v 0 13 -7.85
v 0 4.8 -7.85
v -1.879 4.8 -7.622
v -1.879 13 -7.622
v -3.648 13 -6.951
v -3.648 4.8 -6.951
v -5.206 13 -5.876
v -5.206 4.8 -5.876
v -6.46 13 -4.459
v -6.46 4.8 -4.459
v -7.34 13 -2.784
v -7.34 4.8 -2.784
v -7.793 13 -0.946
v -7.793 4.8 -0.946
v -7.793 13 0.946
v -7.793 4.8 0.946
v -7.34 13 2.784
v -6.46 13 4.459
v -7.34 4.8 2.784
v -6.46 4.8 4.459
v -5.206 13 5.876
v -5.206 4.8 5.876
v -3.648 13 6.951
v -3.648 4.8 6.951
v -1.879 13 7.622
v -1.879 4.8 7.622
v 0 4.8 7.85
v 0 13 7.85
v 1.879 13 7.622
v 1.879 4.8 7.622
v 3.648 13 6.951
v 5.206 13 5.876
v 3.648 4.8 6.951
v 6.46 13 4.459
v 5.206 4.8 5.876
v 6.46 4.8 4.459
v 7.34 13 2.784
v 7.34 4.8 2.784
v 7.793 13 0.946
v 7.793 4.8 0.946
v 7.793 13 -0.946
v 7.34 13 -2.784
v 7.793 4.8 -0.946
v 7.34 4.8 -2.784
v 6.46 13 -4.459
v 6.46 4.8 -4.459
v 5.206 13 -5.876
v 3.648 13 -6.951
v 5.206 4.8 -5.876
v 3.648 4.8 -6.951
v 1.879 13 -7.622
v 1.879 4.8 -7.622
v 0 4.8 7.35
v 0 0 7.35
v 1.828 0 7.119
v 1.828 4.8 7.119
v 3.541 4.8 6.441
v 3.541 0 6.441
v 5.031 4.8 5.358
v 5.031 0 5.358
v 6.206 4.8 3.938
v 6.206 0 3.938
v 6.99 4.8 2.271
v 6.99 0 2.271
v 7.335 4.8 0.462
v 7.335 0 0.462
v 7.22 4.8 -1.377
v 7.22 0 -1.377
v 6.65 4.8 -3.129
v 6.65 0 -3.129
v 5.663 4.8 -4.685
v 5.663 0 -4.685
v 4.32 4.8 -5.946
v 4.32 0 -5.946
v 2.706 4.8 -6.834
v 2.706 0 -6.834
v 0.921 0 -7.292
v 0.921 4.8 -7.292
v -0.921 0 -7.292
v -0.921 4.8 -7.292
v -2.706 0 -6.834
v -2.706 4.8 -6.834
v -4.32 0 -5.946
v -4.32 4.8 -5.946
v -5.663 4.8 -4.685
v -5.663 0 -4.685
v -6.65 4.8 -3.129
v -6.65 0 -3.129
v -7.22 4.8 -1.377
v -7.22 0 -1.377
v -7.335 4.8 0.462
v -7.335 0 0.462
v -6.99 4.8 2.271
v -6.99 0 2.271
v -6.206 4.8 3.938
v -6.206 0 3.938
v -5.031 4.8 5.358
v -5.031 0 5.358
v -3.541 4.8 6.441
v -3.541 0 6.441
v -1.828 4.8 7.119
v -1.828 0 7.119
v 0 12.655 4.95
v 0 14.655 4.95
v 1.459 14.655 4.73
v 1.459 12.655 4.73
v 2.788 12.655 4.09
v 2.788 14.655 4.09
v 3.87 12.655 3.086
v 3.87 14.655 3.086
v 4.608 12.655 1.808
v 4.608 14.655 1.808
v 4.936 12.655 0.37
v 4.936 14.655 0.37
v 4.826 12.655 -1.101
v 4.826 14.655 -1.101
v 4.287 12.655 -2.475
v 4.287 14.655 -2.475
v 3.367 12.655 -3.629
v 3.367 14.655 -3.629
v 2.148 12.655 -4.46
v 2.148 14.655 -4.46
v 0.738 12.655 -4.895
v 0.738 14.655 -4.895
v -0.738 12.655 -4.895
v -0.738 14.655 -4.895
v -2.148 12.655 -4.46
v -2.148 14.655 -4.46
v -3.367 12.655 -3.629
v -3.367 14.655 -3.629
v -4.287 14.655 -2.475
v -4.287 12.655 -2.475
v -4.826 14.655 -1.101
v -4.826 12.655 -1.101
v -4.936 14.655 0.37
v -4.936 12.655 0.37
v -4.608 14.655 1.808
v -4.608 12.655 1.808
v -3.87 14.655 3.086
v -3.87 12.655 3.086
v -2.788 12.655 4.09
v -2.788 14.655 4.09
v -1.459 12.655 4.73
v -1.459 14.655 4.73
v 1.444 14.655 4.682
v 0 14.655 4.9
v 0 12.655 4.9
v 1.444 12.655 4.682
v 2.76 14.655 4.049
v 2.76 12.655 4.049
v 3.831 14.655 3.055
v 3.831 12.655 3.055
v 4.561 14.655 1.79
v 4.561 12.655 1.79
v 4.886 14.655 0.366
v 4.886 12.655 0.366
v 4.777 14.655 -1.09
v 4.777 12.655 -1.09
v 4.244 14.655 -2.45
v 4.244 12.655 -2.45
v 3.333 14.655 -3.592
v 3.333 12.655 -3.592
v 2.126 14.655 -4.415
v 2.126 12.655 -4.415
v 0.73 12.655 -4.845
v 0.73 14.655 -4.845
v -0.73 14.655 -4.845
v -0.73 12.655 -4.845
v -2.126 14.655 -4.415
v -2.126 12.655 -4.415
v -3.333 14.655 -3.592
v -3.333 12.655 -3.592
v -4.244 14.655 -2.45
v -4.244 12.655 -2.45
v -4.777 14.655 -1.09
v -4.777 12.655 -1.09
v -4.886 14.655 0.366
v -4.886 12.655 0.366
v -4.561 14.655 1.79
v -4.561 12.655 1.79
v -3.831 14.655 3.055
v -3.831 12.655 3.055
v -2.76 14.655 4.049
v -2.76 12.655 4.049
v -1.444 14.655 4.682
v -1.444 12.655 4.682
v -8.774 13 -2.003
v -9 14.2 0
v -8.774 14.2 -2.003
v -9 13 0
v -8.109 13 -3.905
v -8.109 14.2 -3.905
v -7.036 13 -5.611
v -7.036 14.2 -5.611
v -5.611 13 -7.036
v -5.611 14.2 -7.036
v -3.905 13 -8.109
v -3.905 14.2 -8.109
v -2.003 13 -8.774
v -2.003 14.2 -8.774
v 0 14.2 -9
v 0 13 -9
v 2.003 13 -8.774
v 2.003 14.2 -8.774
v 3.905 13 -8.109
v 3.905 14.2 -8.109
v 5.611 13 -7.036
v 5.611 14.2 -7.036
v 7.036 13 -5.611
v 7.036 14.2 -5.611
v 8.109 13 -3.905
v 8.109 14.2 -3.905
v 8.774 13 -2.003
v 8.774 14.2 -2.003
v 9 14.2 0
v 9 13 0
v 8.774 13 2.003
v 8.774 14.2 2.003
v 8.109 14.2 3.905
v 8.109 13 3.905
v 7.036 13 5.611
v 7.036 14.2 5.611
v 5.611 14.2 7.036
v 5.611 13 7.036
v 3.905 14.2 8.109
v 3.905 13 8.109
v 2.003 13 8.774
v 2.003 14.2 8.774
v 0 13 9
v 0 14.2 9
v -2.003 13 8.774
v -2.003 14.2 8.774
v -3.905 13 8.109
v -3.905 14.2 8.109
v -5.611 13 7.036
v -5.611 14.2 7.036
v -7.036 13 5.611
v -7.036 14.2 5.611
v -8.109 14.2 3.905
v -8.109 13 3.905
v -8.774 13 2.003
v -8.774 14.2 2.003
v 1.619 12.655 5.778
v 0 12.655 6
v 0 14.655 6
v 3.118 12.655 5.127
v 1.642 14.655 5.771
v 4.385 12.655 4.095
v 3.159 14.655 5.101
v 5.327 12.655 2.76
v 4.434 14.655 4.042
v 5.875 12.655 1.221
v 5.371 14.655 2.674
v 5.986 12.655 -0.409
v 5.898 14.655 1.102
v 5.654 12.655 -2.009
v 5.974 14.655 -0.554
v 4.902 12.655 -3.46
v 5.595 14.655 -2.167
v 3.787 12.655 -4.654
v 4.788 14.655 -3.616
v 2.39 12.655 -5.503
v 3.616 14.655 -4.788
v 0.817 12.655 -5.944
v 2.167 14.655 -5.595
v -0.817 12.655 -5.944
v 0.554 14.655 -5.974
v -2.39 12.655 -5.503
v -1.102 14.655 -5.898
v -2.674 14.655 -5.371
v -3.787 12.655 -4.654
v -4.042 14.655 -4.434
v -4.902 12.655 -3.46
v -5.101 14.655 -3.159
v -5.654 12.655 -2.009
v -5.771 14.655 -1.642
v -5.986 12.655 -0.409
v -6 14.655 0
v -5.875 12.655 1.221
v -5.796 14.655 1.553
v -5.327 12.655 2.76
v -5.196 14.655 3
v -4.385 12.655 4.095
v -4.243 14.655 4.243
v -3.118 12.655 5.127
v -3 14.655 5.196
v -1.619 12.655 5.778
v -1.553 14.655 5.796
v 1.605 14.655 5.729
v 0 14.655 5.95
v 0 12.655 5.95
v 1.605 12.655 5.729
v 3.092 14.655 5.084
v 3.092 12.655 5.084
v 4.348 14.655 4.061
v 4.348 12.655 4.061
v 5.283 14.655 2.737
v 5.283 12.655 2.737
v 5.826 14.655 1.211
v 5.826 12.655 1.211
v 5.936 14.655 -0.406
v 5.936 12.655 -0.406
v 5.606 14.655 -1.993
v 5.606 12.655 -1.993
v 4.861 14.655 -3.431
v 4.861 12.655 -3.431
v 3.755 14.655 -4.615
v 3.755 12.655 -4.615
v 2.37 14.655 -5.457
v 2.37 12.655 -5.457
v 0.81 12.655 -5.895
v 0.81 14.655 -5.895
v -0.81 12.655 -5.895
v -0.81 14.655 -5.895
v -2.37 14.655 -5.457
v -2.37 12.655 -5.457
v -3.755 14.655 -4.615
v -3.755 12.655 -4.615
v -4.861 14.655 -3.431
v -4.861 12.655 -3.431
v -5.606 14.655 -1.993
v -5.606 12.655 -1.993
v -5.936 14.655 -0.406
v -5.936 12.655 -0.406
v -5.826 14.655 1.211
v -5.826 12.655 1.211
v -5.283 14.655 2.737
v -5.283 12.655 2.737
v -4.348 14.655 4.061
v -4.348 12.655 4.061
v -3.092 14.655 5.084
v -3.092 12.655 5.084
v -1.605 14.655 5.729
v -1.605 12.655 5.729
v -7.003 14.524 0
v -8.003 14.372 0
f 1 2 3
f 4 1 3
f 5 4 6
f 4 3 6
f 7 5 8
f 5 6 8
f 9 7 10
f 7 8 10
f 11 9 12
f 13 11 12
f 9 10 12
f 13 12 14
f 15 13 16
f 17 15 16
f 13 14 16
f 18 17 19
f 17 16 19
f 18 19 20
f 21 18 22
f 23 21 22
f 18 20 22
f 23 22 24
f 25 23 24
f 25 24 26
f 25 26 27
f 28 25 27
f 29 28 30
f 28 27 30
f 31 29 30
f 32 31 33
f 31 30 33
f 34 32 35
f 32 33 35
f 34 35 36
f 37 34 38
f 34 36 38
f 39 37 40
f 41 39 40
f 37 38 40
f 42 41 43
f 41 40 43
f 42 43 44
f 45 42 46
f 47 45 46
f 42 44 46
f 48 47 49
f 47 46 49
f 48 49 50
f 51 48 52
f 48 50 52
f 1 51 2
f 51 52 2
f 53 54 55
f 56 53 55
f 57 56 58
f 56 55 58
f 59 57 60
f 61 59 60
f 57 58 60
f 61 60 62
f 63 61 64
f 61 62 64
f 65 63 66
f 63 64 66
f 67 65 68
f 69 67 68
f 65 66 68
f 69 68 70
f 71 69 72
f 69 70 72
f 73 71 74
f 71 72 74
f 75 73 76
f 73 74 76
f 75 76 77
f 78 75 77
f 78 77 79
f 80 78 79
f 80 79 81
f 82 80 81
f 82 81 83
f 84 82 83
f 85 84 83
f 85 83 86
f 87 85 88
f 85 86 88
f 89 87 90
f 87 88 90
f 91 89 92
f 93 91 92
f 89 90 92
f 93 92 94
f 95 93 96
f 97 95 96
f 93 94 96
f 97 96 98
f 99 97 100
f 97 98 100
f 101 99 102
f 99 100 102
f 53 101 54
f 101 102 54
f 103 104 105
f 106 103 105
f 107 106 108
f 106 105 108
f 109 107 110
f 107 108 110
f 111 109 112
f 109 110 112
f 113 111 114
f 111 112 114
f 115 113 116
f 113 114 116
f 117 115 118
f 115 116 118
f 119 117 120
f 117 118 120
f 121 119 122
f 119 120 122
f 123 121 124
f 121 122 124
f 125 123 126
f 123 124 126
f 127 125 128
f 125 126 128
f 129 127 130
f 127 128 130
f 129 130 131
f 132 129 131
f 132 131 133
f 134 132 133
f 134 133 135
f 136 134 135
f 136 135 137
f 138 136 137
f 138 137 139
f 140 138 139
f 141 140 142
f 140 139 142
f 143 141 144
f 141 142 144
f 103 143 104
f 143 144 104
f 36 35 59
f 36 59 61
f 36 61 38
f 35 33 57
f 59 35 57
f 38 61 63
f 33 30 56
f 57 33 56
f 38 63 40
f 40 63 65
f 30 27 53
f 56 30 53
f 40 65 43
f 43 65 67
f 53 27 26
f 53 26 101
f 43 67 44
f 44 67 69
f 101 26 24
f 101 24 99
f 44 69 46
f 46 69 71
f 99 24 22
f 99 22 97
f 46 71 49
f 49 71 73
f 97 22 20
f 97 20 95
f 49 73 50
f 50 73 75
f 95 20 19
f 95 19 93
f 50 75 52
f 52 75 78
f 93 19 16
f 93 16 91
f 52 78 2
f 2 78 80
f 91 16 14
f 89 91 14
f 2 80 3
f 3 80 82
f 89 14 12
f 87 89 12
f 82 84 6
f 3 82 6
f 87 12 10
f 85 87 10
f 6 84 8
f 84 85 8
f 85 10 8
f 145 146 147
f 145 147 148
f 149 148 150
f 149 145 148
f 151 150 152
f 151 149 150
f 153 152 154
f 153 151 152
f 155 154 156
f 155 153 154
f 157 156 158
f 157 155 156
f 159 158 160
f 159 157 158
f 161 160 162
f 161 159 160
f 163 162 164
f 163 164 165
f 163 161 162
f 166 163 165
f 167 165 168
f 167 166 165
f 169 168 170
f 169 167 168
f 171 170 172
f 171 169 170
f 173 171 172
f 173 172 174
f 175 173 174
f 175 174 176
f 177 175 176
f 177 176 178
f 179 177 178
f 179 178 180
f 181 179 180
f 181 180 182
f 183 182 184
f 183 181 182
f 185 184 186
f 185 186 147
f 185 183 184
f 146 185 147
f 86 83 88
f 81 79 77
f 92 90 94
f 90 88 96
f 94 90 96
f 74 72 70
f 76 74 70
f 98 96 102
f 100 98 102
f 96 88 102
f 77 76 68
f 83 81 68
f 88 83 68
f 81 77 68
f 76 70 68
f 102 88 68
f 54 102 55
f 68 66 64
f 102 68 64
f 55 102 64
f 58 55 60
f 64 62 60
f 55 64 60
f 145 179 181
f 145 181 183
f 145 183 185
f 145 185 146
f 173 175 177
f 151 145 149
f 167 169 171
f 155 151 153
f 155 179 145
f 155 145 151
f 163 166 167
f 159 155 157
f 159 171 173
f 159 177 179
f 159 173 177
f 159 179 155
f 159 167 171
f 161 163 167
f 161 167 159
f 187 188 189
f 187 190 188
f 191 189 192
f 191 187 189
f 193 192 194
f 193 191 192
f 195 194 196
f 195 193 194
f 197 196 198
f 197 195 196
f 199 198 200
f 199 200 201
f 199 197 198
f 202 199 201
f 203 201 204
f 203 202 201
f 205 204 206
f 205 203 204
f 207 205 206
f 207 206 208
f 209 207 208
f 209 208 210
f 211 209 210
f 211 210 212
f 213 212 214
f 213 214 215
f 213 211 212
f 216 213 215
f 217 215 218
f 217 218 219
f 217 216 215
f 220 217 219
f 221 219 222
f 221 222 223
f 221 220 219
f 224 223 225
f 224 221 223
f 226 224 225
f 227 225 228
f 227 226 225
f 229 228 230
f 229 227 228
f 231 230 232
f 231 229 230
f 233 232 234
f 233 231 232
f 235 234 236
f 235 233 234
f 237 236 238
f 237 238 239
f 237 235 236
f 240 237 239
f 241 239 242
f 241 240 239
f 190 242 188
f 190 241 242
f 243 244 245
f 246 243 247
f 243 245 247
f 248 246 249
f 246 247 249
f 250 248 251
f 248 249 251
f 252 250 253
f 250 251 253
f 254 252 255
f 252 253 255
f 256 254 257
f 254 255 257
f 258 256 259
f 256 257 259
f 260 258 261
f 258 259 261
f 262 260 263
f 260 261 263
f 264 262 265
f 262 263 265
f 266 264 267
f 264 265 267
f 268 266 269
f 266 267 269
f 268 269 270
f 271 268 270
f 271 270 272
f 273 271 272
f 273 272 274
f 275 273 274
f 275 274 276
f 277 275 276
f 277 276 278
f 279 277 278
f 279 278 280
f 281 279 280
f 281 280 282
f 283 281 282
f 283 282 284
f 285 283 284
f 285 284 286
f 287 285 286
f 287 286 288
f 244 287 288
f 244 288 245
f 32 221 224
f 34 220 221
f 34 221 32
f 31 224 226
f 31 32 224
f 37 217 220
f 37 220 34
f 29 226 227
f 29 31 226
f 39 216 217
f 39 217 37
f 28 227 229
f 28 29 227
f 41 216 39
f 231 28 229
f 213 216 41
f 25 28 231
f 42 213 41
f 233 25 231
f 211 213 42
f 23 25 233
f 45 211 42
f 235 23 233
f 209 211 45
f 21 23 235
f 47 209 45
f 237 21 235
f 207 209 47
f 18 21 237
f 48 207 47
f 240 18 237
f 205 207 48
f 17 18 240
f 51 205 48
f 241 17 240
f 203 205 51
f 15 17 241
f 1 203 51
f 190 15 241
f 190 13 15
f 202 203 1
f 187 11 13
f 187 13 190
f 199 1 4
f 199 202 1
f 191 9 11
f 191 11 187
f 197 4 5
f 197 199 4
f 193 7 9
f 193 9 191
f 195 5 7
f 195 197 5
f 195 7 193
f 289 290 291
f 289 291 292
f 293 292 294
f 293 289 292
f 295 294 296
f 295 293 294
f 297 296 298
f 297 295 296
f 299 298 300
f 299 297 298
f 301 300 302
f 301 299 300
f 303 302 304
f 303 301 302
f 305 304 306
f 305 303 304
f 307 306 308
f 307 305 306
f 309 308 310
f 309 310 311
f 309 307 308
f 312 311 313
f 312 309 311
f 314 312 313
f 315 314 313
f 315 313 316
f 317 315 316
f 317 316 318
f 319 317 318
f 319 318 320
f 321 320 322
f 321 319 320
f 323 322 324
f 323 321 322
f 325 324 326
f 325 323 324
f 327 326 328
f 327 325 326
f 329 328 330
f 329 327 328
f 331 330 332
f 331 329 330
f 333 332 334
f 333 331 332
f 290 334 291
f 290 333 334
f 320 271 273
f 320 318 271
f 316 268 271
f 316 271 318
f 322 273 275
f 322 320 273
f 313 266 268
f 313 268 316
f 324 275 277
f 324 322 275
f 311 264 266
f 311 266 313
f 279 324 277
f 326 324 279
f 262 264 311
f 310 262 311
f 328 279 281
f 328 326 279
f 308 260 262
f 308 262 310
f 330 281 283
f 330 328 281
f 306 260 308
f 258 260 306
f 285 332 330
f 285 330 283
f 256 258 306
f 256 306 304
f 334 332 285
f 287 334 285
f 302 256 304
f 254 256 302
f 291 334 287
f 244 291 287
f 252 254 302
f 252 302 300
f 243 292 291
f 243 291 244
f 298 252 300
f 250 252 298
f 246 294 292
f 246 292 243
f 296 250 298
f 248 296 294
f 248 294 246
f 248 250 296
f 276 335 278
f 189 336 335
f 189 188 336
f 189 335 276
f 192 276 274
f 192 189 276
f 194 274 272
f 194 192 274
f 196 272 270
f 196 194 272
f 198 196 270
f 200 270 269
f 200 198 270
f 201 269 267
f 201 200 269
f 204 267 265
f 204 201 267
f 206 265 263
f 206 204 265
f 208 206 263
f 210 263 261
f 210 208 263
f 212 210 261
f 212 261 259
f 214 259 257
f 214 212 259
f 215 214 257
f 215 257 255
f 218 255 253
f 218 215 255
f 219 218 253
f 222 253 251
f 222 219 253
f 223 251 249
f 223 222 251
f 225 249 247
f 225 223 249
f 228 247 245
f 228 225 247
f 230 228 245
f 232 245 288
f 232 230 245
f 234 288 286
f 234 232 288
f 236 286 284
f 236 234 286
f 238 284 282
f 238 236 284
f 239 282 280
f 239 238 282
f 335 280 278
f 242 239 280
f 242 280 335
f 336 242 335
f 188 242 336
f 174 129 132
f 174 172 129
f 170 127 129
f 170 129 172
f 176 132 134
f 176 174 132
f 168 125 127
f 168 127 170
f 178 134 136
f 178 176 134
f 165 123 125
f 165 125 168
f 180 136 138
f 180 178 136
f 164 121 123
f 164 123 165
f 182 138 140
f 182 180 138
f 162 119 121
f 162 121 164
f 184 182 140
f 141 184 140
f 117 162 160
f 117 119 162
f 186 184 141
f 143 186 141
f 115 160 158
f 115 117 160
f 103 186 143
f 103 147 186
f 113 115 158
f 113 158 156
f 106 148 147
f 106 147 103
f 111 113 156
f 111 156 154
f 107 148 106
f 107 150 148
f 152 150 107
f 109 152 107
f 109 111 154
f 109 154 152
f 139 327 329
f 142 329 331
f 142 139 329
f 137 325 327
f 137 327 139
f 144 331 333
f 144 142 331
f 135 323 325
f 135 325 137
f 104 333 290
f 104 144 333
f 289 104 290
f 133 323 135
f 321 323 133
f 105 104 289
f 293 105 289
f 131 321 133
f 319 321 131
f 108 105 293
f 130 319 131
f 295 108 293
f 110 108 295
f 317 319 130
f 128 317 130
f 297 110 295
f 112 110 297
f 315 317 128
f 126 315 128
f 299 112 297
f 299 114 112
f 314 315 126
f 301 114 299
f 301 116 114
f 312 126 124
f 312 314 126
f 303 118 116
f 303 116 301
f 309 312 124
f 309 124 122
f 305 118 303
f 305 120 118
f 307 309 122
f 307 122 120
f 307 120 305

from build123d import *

# Parameters (mm, degrees)
SKETCH1_R           = 7.35
BOSS_EXTRUDE1_DEPTH = 4.8
SKETCH2_R           = 7.85
BOSS_EXTRUDE2_DEPTH = 8.2
SKETCH4_R           = 6
SKETCH4_R_2         = 5.95
SKETCH4_R_3         = 4.95
SKETCH4_R_4         = 4.9
CUT_EXTRUDE1_DEPTH  = 2


with BuildPart() as part:
    # Sketch1 → Boss-Extrude1 (new body)
    with BuildSketch(Plane(origin=(0, 0, 0), x_dir=(1, 0, 0), z_dir=(0, 1, 0))):
        with Locations(Location((0, 0, 0), (0, 0, 270))):
            Circle(SKETCH1_R)
    extrude(amount=BOSS_EXTRUDE1_DEPTH)

    # Sketch2 → Boss-Extrude2 (add)
    with BuildSketch(Plane(origin=(0, 4.8, 0), x_dir=(1, 0, 0), z_dir=(0, 1, 0))):
        with Locations(Location((0, 0, 0), (0, 0, 90))):
            Circle(SKETCH2_R)
    extrude(amount=BOSS_EXTRUDE2_DEPTH)

    # Sketch3 → Revolve2 (revolve)
    with BuildSketch(Plane.XY):
        with BuildLine():
            Line((-9, 13), (-7.85, 13))
            Line((-7.85, 13), (0, 13))
            Line((0, 13), (0, 14.655364075))
            Line((0, 14.655364075), (-6, 14.655364075))
            ThreePointArc((-6, 14.655364075), (-7.503455145, 14.450444998), (-9, 14.2))
            Line((-9, 14.2), (-9, 13))
        make_face()
    revolve(axis=Axis((0, 15.200891001, 0), (0, -1, 0)))

    # Sketch4 → Cut-Extrude1 (cut)
    # profile 1 of 2: a face of its own
    with BuildSketch(Plane(origin=(0, 14.655364075, 0), x_dir=(1, 0, 0), z_dir=(0, 1, 0))):
        with Locations(Location((0, 0, 0), (0, 0, 270))):
            Circle(SKETCH4_R)
        with Locations(Location((0, 0, 0), (0, 0, 270))):
            Circle(SKETCH4_R_2, mode=Mode.SUBTRACT)
    # profile 2 of 2: a face of its own
    with BuildSketch(Plane(origin=(0, 14.655364075, 0), x_dir=(1, 0, 0), z_dir=(0, 1, 0))):
        with Locations(Location((0, 0, 0), (0, 0, 270))):
            Circle(SKETCH4_R_3)
        with Locations(Location((0, 0, 0), (0, 0, 270))):
            Circle(SKETCH4_R_4, mode=Mode.SUBTRACT)
    extrude(amount=-CUT_EXTRUDE1_DEPTH, mode=Mode.SUBTRACT)


solid = part.part
